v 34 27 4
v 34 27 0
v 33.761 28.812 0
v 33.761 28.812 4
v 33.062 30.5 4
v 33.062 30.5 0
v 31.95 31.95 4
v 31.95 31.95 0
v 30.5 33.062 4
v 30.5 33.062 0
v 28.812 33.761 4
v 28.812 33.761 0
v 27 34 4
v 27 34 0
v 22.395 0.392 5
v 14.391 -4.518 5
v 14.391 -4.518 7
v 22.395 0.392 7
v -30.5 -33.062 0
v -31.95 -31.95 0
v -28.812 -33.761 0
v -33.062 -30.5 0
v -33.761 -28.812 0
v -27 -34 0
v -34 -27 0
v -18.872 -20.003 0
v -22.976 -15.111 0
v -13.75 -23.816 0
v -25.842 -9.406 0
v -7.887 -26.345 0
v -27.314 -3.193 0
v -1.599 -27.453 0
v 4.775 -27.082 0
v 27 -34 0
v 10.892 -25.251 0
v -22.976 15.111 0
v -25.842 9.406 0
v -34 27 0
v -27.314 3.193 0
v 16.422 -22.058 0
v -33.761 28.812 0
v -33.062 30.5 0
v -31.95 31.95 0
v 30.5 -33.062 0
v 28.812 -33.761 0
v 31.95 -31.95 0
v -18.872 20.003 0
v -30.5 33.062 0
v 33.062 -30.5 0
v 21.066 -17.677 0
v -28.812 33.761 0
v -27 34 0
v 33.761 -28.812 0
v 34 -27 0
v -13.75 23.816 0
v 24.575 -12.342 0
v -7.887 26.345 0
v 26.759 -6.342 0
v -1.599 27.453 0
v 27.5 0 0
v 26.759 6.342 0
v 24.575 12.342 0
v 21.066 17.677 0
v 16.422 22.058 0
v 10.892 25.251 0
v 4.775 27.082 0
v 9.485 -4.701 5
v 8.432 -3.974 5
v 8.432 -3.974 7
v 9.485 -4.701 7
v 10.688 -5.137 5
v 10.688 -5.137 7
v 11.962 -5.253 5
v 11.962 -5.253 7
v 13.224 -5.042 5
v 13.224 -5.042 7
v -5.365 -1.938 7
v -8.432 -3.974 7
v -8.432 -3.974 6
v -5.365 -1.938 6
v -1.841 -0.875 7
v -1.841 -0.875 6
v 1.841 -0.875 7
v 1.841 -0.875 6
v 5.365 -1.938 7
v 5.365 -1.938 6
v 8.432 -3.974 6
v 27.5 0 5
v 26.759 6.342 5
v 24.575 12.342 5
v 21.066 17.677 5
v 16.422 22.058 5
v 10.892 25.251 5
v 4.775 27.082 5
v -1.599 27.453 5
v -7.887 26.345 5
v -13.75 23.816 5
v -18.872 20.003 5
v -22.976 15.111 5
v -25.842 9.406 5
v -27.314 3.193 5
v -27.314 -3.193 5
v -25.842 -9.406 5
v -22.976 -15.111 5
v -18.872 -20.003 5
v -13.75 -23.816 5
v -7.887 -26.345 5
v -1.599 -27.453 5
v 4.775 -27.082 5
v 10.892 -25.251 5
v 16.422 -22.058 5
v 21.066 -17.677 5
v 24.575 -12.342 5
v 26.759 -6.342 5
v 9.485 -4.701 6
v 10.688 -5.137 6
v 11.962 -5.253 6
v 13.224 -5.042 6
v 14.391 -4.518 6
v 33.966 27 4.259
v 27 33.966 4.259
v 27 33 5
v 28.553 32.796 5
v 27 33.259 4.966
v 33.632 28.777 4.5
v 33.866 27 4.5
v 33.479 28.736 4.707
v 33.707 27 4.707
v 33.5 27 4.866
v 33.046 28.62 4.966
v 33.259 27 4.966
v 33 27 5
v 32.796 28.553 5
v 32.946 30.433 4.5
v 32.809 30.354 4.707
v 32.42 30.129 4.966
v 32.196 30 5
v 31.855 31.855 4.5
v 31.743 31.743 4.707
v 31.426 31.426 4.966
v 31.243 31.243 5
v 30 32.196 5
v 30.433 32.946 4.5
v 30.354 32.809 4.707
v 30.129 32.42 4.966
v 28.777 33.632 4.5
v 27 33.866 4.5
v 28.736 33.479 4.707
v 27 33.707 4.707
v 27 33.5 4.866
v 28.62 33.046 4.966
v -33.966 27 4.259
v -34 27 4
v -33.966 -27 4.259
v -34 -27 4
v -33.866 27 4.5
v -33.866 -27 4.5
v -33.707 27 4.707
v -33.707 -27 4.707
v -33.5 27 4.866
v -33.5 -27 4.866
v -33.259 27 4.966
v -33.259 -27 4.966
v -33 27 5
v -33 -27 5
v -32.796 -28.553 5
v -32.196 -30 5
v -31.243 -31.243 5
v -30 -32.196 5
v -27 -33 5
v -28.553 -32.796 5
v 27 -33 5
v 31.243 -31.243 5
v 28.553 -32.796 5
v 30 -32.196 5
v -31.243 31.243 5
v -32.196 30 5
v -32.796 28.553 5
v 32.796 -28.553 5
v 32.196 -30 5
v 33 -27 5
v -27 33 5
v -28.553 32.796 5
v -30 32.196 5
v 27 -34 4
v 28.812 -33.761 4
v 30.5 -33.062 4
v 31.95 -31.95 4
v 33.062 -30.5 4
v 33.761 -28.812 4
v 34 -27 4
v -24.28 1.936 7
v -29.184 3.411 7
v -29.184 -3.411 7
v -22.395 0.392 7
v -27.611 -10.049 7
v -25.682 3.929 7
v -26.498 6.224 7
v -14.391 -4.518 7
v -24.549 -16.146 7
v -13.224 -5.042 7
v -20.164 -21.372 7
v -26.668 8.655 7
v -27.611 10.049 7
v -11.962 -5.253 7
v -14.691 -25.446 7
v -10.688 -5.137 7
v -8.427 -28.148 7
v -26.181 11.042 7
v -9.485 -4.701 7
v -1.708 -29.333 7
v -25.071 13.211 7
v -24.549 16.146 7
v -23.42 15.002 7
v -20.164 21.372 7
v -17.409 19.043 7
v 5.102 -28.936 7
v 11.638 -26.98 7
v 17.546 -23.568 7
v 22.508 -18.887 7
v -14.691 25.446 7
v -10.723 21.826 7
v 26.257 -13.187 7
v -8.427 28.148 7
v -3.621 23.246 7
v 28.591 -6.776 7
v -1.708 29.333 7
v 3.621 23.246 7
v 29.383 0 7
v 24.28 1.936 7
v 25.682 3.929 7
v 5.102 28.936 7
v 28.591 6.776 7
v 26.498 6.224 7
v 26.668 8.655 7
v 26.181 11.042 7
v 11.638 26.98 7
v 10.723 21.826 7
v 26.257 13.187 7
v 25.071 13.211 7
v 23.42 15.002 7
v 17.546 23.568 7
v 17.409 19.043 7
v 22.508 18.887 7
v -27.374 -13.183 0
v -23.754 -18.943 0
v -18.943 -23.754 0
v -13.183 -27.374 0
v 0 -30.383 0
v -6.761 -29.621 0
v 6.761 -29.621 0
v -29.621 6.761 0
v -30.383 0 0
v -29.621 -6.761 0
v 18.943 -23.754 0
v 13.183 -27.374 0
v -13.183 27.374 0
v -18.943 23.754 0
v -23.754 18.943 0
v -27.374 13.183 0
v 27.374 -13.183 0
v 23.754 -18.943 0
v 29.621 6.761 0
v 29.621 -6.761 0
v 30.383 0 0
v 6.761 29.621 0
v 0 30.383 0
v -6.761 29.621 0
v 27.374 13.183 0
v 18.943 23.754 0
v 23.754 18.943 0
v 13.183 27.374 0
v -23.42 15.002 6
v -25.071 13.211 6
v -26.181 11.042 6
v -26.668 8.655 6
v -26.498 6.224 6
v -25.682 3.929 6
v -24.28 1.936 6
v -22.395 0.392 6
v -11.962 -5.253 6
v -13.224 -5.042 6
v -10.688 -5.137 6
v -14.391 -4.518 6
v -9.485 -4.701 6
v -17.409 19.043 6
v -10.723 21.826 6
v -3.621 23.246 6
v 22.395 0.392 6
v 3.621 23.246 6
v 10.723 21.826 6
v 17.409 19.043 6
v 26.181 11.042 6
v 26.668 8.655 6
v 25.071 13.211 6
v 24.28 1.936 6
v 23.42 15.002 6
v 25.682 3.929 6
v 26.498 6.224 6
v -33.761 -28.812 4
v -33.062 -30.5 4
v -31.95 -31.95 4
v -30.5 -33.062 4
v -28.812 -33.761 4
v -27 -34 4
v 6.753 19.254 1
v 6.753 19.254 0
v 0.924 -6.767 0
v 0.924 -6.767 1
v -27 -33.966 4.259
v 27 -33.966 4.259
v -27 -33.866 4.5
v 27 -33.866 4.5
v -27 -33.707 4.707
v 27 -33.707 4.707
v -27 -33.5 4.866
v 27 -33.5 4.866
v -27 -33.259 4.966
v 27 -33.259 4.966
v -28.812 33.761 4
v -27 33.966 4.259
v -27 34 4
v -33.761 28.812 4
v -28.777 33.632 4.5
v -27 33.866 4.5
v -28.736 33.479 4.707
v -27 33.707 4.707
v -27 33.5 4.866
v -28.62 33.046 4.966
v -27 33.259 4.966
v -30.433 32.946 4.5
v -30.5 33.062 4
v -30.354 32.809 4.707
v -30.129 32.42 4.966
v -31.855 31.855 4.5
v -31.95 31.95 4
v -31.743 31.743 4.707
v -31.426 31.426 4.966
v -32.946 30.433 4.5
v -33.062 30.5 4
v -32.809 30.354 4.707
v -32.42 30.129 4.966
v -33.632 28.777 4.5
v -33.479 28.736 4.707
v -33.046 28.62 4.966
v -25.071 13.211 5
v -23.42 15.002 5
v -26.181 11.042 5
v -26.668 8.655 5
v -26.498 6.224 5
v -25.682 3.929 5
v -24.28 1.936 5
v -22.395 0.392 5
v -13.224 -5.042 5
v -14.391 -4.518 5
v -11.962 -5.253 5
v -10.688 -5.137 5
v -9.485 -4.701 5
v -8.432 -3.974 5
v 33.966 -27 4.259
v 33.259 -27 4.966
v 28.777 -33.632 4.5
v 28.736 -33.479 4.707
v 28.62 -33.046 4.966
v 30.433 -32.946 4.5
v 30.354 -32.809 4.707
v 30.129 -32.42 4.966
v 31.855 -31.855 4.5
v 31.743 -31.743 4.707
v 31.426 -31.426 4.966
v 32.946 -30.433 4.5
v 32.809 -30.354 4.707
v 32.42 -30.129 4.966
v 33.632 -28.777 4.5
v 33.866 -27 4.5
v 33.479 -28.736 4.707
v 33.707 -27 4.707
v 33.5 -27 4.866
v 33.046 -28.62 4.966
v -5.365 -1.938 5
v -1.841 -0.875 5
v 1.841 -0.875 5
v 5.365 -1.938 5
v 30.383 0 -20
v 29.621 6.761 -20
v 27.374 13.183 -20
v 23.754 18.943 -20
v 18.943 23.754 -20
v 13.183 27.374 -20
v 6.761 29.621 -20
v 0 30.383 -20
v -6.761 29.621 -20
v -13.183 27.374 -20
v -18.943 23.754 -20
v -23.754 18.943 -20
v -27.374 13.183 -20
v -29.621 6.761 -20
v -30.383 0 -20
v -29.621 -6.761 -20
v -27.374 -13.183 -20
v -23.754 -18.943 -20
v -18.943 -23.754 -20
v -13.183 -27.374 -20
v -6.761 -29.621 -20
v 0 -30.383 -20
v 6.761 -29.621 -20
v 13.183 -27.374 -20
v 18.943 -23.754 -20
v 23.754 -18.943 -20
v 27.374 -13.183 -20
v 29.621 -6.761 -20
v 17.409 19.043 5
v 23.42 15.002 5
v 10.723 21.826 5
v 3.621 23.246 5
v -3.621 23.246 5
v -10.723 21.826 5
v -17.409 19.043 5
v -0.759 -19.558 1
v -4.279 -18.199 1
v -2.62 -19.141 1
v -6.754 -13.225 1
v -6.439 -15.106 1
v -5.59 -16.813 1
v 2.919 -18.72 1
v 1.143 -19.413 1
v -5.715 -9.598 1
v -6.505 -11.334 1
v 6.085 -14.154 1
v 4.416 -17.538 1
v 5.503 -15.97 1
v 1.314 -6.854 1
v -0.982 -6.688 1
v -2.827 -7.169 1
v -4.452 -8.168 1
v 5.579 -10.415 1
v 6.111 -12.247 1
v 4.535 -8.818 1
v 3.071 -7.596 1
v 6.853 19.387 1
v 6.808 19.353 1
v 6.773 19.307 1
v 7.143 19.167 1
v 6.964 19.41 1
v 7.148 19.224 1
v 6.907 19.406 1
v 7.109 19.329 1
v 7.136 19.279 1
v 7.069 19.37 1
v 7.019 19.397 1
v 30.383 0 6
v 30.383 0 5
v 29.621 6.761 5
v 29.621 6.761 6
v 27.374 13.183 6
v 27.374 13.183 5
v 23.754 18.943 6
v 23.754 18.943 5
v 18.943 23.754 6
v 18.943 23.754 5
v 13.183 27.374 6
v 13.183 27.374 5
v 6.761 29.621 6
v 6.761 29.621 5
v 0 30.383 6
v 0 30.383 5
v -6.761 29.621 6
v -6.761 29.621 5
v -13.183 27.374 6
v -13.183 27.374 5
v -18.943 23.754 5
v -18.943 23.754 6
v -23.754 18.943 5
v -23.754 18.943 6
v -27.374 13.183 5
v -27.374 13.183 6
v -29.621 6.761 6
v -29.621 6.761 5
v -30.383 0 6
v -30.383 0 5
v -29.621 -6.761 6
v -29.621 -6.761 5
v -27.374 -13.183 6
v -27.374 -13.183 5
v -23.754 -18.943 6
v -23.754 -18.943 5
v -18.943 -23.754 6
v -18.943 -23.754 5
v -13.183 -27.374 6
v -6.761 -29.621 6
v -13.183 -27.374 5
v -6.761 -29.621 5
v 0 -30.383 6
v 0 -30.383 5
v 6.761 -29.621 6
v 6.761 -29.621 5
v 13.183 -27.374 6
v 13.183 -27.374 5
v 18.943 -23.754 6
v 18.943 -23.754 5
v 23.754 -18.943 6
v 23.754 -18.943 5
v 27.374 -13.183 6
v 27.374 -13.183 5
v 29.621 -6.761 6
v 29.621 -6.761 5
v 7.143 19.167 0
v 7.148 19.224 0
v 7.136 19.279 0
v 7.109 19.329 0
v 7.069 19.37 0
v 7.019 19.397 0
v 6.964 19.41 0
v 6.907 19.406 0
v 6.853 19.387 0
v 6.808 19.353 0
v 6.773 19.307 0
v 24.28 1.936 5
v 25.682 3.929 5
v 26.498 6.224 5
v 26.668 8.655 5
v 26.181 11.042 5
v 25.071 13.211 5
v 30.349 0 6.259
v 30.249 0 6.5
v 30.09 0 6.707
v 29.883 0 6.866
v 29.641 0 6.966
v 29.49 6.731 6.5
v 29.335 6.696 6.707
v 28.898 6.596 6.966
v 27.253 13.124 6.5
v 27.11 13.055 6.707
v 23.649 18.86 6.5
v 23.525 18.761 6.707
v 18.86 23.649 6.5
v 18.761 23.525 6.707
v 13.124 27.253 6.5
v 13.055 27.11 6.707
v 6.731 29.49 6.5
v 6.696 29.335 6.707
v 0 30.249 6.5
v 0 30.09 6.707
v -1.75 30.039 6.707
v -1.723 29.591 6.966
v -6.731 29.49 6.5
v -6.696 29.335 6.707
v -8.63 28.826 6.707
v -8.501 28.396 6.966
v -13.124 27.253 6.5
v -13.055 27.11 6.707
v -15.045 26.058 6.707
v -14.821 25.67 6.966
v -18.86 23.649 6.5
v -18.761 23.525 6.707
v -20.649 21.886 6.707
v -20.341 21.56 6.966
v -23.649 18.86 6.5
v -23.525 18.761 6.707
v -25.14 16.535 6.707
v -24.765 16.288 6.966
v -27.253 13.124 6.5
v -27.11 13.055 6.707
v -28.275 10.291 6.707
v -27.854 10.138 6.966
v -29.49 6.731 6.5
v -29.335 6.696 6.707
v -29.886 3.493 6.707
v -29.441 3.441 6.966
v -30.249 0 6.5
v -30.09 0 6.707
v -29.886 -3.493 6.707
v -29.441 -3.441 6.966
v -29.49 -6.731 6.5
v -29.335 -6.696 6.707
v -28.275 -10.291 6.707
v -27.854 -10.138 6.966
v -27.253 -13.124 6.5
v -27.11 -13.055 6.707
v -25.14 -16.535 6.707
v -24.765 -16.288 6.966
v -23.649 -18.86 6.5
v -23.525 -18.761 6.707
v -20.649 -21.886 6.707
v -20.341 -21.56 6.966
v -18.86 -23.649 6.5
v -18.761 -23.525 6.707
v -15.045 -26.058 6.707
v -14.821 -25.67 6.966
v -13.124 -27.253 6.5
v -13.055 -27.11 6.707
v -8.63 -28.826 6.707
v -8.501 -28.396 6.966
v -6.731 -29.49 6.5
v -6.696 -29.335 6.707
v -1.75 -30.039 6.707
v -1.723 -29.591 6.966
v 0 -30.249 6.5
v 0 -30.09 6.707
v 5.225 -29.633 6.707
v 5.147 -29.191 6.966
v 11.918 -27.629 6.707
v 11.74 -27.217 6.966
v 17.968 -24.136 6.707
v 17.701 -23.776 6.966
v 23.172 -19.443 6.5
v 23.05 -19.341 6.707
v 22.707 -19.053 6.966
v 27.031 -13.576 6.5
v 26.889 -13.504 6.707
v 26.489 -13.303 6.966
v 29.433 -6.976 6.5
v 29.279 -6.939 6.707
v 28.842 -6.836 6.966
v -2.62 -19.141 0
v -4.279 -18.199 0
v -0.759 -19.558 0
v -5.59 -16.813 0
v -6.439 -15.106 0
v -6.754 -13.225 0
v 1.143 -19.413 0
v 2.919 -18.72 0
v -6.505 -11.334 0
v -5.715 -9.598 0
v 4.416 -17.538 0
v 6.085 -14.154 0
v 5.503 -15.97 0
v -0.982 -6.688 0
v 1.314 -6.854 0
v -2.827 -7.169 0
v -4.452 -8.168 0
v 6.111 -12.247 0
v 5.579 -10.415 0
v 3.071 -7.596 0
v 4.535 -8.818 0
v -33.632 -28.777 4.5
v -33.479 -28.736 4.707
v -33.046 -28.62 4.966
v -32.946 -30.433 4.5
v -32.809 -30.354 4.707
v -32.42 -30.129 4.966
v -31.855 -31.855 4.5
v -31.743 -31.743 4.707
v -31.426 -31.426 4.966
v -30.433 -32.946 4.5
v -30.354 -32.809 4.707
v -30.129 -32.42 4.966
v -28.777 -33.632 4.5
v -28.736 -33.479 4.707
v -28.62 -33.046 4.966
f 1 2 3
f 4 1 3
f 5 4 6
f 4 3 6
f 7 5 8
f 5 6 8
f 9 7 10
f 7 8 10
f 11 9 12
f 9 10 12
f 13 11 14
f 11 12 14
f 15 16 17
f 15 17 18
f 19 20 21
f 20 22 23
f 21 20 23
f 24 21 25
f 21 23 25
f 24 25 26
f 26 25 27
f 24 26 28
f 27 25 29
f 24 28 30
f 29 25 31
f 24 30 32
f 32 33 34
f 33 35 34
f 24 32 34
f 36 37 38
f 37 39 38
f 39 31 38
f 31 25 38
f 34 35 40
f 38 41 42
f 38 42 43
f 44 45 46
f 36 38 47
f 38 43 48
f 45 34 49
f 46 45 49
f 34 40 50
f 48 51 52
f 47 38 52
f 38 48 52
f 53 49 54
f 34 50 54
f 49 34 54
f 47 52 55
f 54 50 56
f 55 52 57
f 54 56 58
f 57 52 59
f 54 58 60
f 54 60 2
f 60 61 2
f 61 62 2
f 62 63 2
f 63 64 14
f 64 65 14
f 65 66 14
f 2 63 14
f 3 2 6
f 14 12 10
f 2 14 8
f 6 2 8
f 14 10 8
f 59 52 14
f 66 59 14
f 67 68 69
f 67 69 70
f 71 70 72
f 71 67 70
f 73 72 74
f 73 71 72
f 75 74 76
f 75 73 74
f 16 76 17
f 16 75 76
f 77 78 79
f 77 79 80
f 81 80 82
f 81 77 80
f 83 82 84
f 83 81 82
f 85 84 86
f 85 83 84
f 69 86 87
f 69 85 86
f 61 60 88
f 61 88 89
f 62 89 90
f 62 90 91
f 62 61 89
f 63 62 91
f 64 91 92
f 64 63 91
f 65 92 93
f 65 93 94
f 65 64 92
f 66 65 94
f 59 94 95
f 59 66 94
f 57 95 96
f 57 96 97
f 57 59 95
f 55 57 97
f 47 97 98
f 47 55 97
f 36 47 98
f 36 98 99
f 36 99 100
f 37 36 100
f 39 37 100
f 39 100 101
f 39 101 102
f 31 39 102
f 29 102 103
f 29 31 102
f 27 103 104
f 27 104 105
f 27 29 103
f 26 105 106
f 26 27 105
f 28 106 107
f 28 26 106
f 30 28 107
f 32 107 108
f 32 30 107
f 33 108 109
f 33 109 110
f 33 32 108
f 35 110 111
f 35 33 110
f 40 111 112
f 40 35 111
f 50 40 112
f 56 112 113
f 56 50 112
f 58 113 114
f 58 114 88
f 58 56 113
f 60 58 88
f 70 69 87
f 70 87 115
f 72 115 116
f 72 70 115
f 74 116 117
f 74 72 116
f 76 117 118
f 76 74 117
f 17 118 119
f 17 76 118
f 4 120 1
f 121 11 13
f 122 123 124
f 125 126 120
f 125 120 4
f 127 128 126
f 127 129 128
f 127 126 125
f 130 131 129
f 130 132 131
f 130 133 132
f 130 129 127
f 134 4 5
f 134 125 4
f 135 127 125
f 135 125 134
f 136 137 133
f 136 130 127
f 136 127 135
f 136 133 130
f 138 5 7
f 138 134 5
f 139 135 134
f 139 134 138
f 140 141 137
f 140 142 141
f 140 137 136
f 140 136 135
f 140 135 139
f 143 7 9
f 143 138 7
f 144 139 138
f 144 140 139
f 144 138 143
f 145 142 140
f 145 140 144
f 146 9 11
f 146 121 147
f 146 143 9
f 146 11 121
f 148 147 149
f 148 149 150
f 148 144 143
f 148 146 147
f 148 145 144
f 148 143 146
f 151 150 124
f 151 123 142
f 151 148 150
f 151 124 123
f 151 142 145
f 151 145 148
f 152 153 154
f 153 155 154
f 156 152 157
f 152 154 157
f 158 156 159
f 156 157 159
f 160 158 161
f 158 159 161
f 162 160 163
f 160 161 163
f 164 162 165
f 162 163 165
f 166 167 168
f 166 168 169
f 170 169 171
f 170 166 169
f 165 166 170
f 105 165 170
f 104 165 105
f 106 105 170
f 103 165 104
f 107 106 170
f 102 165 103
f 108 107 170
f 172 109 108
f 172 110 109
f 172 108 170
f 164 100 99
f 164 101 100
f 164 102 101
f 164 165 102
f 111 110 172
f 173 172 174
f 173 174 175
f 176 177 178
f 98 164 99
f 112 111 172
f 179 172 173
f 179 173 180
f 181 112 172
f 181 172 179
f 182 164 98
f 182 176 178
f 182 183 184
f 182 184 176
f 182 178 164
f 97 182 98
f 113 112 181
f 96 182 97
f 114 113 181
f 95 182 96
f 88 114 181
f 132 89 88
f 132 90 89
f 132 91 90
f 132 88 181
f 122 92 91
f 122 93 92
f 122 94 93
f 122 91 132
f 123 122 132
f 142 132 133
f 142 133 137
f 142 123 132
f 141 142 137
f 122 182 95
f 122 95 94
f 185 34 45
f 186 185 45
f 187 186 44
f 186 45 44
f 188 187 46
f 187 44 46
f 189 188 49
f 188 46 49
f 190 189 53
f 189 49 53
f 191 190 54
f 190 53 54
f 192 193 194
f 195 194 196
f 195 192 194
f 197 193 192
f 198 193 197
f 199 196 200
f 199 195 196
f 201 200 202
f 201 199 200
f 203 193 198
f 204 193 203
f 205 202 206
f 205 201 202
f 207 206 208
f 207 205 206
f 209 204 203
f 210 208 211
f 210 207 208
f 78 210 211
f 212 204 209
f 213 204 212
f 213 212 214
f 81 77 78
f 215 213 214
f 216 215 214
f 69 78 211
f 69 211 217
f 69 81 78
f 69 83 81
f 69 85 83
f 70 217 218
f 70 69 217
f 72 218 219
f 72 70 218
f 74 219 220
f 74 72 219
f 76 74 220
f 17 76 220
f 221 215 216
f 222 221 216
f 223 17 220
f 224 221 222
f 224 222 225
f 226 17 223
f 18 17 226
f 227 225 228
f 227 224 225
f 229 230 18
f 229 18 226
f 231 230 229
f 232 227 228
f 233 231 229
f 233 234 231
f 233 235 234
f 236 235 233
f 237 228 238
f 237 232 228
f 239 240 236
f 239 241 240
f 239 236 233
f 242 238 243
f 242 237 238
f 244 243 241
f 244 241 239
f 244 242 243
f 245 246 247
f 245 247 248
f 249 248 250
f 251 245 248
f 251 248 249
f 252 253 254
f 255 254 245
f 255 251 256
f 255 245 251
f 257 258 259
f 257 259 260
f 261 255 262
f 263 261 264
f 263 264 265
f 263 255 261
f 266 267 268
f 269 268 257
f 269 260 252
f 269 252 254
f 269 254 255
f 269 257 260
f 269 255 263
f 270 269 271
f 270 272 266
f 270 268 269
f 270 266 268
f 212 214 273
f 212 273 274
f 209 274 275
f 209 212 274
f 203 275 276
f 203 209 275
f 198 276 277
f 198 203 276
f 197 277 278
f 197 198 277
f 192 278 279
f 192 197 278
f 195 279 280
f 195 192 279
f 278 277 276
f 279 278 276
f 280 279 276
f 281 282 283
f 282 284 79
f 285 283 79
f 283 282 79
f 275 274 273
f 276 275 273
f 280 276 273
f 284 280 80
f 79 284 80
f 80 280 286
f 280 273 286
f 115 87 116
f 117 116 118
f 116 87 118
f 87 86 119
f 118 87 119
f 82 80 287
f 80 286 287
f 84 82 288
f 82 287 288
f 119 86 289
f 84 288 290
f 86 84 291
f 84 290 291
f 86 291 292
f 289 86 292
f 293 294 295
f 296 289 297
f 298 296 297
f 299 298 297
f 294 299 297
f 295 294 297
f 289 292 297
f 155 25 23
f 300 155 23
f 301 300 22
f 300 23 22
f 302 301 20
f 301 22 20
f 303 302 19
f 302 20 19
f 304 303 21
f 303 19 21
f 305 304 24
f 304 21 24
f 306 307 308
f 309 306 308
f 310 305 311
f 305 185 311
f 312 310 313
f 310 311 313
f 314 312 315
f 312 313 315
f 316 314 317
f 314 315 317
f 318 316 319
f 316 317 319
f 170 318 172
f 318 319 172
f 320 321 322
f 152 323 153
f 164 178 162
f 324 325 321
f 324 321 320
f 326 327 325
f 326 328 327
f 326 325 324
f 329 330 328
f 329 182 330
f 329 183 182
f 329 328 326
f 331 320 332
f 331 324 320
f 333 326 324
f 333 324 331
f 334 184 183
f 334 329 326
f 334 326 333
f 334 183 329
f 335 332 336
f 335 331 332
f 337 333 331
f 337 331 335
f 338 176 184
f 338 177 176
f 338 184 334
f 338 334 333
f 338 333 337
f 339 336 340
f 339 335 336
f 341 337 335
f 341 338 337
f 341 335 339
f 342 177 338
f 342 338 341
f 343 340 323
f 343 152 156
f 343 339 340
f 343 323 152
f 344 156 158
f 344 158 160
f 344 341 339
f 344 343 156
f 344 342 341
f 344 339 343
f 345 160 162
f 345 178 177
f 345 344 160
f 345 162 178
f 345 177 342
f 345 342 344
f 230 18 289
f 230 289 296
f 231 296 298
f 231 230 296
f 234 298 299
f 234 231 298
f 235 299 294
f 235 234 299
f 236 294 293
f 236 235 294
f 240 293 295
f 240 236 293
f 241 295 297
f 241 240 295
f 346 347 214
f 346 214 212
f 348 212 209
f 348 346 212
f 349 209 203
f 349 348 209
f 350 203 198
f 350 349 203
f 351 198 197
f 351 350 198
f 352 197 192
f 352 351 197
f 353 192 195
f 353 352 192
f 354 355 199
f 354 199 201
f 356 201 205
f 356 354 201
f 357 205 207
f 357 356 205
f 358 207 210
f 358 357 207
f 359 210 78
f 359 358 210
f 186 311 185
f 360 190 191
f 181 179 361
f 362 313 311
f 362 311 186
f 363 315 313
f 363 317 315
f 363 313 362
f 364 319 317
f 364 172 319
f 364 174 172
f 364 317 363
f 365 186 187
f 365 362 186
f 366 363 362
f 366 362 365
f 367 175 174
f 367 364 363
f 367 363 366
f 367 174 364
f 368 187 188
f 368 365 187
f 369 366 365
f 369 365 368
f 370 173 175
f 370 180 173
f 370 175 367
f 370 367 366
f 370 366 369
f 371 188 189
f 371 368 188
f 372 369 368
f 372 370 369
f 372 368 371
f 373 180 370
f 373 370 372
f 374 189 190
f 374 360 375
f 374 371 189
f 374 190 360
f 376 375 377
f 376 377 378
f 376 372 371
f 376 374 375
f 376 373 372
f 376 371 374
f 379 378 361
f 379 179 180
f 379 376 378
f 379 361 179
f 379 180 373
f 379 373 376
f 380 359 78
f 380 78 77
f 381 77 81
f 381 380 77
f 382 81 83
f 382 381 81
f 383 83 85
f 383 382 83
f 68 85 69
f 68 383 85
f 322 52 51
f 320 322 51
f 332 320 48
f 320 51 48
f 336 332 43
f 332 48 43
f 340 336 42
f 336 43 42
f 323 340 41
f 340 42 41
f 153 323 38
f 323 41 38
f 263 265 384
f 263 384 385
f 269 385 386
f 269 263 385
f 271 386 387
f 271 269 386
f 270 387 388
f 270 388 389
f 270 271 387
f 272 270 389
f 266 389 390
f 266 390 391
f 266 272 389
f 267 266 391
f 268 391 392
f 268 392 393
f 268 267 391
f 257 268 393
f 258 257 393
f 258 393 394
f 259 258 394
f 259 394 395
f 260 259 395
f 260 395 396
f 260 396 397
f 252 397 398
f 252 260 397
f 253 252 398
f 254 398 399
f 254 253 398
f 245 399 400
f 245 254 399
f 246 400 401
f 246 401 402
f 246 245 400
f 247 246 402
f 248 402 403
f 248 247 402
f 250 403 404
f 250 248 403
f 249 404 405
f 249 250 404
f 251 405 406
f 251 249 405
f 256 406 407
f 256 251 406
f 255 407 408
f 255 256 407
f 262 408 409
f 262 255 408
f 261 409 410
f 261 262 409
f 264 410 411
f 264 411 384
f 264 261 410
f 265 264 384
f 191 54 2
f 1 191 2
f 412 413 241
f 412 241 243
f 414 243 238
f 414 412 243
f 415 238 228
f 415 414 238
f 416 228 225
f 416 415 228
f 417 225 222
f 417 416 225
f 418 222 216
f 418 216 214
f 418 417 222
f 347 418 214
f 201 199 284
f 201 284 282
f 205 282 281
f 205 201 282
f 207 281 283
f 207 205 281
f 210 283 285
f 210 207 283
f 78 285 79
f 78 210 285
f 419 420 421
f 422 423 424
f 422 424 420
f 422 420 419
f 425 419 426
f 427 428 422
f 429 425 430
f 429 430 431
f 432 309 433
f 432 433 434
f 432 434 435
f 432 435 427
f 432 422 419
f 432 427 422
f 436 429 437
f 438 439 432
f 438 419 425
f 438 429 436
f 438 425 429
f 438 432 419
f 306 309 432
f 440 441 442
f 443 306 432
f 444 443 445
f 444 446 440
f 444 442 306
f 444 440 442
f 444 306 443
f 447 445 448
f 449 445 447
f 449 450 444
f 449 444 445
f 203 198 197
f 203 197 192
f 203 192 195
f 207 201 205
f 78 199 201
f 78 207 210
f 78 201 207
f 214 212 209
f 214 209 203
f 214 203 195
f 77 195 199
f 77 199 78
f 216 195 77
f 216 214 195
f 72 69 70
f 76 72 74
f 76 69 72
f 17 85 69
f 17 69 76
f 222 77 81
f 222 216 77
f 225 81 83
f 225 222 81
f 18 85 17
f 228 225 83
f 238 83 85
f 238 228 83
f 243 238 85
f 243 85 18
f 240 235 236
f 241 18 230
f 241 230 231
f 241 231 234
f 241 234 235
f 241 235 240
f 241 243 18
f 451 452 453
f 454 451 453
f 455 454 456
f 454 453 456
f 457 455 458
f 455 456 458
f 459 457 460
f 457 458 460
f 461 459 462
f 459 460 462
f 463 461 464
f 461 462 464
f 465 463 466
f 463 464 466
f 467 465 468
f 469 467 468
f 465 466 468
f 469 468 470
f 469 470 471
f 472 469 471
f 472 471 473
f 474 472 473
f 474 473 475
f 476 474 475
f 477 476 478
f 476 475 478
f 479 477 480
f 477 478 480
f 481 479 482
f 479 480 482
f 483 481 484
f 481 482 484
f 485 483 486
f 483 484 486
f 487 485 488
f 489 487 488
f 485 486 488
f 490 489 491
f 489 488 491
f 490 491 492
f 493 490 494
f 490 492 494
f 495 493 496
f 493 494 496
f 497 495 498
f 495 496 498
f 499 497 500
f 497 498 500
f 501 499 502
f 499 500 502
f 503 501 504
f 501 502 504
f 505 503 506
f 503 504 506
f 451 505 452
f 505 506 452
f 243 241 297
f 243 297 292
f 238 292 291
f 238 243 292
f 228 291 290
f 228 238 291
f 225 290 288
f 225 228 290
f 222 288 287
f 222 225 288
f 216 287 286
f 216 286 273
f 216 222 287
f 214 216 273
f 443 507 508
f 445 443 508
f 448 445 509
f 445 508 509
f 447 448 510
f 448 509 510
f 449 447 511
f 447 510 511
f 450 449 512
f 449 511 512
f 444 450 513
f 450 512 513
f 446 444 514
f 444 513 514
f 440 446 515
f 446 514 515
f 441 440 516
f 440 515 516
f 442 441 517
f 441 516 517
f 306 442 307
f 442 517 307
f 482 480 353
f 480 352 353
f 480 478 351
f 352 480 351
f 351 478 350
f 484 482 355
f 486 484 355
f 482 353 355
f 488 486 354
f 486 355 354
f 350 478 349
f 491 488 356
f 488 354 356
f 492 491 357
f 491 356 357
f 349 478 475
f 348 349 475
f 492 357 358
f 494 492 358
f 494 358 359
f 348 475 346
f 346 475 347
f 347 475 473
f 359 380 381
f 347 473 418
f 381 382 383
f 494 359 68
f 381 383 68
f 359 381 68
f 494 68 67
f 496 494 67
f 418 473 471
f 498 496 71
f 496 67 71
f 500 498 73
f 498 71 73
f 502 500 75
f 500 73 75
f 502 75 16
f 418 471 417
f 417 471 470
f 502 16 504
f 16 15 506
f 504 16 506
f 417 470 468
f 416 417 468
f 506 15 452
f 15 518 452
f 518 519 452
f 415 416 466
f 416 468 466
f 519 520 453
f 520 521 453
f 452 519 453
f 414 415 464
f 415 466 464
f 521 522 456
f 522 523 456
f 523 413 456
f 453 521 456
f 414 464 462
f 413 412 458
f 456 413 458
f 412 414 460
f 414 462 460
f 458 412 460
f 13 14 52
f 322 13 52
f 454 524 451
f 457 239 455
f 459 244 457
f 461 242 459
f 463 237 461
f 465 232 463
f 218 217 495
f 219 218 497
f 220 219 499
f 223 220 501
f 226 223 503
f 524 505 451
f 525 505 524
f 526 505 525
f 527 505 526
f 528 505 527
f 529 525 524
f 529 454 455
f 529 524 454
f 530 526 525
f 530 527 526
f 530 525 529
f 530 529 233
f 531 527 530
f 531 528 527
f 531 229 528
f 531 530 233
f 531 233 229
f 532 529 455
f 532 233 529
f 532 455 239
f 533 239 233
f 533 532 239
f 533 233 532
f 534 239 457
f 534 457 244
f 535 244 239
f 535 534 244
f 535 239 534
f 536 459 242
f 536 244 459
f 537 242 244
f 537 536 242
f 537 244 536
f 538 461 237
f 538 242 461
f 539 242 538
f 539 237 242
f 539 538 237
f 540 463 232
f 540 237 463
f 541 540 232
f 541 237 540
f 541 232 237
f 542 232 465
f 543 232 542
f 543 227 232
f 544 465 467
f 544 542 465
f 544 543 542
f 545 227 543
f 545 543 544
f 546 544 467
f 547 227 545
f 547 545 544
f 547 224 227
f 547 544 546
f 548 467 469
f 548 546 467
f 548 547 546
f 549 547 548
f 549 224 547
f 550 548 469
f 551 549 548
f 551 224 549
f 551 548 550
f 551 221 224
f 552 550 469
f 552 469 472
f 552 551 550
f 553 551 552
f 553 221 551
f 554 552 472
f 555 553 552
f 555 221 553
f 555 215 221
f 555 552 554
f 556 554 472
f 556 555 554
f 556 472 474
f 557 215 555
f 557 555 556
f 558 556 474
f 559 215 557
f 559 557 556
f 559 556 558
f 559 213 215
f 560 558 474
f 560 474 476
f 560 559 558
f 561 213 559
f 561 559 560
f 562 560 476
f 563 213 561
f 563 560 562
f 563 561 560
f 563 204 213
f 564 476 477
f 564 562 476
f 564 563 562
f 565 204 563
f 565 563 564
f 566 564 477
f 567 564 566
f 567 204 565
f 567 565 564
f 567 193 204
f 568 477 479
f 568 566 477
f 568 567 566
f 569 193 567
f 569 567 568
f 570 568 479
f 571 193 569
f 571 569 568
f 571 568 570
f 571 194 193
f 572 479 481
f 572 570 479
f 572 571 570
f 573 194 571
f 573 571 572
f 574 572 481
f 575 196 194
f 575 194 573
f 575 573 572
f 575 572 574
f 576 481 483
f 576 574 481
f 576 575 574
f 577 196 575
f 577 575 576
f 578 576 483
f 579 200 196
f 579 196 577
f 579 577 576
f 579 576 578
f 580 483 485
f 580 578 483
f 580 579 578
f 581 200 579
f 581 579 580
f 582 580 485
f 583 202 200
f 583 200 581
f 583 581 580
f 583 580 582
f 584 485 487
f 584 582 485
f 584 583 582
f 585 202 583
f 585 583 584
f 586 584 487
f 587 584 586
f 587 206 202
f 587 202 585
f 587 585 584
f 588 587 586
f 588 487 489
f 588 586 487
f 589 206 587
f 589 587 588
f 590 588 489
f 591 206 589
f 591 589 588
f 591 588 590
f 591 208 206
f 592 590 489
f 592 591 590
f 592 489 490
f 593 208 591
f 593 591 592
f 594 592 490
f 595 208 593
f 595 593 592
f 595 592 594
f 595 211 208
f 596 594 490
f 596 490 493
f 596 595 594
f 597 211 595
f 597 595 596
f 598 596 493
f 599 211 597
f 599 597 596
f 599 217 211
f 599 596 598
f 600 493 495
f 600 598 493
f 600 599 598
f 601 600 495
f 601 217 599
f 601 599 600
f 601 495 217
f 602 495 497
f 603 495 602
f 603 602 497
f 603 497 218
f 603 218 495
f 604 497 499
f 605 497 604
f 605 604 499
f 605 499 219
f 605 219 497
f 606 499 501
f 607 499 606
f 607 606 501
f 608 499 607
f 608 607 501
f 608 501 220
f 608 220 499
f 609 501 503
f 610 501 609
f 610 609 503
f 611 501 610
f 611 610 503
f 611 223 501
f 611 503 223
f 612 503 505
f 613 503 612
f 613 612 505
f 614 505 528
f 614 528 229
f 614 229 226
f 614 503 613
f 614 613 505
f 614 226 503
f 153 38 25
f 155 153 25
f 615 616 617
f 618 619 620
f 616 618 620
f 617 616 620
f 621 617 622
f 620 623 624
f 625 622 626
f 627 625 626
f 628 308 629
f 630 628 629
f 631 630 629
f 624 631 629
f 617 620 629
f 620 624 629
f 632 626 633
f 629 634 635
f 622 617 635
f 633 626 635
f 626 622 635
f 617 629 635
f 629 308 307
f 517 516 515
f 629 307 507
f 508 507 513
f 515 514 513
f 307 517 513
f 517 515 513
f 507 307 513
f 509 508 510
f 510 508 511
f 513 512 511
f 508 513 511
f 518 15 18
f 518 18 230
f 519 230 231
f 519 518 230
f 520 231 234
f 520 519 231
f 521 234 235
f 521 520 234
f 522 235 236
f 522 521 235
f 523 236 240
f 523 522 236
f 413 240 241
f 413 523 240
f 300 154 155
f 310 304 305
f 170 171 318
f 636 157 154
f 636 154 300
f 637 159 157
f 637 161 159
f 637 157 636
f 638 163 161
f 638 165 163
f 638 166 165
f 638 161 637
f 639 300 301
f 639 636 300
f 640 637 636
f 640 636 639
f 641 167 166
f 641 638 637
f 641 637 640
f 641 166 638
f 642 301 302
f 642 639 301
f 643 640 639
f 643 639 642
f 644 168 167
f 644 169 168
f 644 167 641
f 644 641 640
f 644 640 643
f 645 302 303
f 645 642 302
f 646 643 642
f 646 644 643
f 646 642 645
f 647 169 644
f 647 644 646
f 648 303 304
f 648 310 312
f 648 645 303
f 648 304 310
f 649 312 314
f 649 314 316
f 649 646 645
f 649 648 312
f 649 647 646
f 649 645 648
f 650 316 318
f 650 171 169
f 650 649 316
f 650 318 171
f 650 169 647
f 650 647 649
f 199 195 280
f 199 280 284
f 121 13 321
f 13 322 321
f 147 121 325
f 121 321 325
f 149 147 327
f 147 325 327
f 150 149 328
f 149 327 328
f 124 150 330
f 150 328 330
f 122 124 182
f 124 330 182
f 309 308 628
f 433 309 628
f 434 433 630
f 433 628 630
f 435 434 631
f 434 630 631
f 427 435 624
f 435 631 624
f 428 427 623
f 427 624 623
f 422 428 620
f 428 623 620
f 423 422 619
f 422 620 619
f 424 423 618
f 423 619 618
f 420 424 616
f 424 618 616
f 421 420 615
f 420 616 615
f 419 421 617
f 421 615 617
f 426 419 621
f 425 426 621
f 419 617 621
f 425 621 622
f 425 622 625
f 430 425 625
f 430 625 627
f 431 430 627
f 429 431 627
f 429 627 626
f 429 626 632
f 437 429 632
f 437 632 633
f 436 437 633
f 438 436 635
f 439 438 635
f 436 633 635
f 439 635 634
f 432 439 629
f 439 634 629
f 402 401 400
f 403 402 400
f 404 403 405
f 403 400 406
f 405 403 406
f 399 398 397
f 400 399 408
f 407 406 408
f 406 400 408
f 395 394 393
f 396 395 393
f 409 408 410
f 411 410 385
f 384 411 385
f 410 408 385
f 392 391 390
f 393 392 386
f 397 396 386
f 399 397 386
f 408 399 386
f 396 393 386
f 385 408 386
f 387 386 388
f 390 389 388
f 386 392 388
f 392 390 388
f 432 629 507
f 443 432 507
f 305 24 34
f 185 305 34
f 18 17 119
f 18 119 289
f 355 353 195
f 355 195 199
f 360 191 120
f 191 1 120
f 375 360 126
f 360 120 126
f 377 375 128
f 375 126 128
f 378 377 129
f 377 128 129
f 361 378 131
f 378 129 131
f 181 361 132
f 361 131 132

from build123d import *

# Parameters (mm, degrees)
SKETCH1_R           = 30.382618143
BOSS_EXTRUDE1_DEPTH = 20
SKETCH2_R           = 27.5
BOSS_EXTRUDE2_DEPTH = 5
SKETCH3_R           = 30.382618143
BOSS_EXTRUDE3_DEPTH = 2
BOSS_EXTRUDE4_DEPTH = 1
BOSS_EXTRUDE5_DEPTH = 1
FILLET1_R           = 1
FILLET2_R           = 1


with BuildPart() as part:
    # Sketch1 → Boss-Extrude1 (new body)
    with BuildSketch(Plane.XY):
        Circle(SKETCH1_R)
    extrude(amount=-BOSS_EXTRUDE1_DEPTH)


with BuildPart() as body_2:
    # Sketch2 → Boss-Extrude2 (new body)
    with BuildSketch(Plane.XY):
        with BuildLine():
            Line((-27, -34), (27, -34))
            ThreePointArc((27, -34), (31.949747468, -31.949747468), (34, -27))
            Line((34, -27), (34, 27))
            ThreePointArc((34, 27), (31.949747468, 31.949747468), (27, 34))
            Line((27, 34), (-27, 34))
            ThreePointArc((-27, 34), (-31.949747468, 31.949747468), (-34, 27))
            Line((-34, 27), (-34, -27))
            ThreePointArc((-34, -27), (-31.949747468, -31.949747468), (-27, -34))
        make_face()
        Circle(SKETCH2_R, mode=Mode.SUBTRACT)
    extrude(amount=BOSS_EXTRUDE2_DEPTH)

    # Fillet2
    fillet2_edges = [body_2.edges().sort_by_distance(p)[0] for p in [
        (-31.949747468, -31.949747468, 5),
        (0, -34, 5),
        (31.949747468, -31.949747468, 5),
        (34, 0, 5),
        (31.949747468, 31.949747468, 5),
        (0, 34, 5),
        (-31.949747468, 31.949747468, 5),
        (-34, 0, 5),
    ]]
    fillet(fillet2_edges, radius=FILLET2_R)


with BuildPart() as body_3:
    # Sketch3 → Boss-Extrude3 (new body)
    with BuildSketch(Plane.XY.offset(5)):
        Circle(SKETCH3_R)
        with BuildLine():
            Line((14.390861658, -4.518418841), (22.394682178, 0.392456244))
            ThreePointArc((22.394682178, 0.392456244), (26.6658507, 7.433621582), (23.419848559, 15.002264787))
            ThreePointArc((23.419848559, 15.002264787), (0, 23.42459846), (-23.419848559, 15.002264787))
            ThreePointArc((-23.419848559, 15.002264787), (-26.6658507, 7.433621582), (-22.394682178, 0.392456244))
            Line((-22.394682178, 0.392456244), (-14.390861658, -4.518418841))
            ThreePointArc((-14.390861658, -4.518418841), (-11.321097129, -5.235935812), (-8.432169686, -3.974039186))
            ThreePointArc((-8.432169686, -3.974039186), (0, -0.739608229), (8.432169686, -3.974039186))
            ThreePointArc((8.432169686, -3.974039186), (11.321097129, -5.235935812), (14.390861658, -4.518418841))
        make_face(mode=Mode.SUBTRACT)
    extrude(amount=BOSS_EXTRUDE3_DEPTH)

    # Fillet1
    fillet1_edges = [body_3.edges().sort_by_distance(p)[0] for p in [
        (-30.382618143, 0, 7),
    ]]
    fillet(fillet1_edges, radius=FILLET1_R)


with BuildPart() as body_4:
    # Sketch4 → Boss-Extrude4 (new body)
    with BuildSketch(Plane.XY):
        with BuildLine():
            Line((1.314265004, -6.854089459), (7.143315201, 19.166790622))
            ThreePointArc((7.143315201, 19.166790622), (6.991871463, 19.405673007), (6.752989077, 19.254229269))
            Line((6.752989077, 19.254229269), (0.92393888, -6.766650812))
            ThreePointArc((0.92393888, -6.766650812), (-1.705267873, -19.418356989), (1.314265004, -6.854089459))
        make_face()
    extrude(amount=BOSS_EXTRUDE4_DEPTH)


with BuildPart() as body_5:
    # Sketch5 → Boss-Extrude5 (new body)
    with BuildSketch(Plane.XY.offset(7)):
        with BuildLine():
            Line((14.390861658, -4.518418841), (22.394682178, 0.392456244))
            ThreePointArc((22.394682178, 0.392456244), (26.6658507, 7.433621582), (23.419848559, 15.002264787))
            ThreePointArc((23.419848559, 15.002264787), (0, 23.42459846), (-23.419848559, 15.002264787))
            ThreePointArc((-23.419848559, 15.002264787), (-26.6658507, 7.433621582), (-22.394682178, 0.392456244))
            Line((-22.394682178, 0.392456244), (-14.390861658, -4.518418841))
            ThreePointArc((-14.390861658, -4.518418841), (-11.321097129, -5.235935812), (-8.432169686, -3.974039186))
            ThreePointArc((-8.432169686, -3.974039186), (0, -0.739608229), (8.432169686, -3.974039186))
            ThreePointArc((8.432169686, -3.974039186), (11.321097129, -5.235935812), (14.390861658, -4.518418841))
        make_face()
    extrude(amount=-BOSS_EXTRUDE5_DEPTH)


solid = Compound([part.part, body_2.part, body_3.part, body_4.part, body_5.part])
